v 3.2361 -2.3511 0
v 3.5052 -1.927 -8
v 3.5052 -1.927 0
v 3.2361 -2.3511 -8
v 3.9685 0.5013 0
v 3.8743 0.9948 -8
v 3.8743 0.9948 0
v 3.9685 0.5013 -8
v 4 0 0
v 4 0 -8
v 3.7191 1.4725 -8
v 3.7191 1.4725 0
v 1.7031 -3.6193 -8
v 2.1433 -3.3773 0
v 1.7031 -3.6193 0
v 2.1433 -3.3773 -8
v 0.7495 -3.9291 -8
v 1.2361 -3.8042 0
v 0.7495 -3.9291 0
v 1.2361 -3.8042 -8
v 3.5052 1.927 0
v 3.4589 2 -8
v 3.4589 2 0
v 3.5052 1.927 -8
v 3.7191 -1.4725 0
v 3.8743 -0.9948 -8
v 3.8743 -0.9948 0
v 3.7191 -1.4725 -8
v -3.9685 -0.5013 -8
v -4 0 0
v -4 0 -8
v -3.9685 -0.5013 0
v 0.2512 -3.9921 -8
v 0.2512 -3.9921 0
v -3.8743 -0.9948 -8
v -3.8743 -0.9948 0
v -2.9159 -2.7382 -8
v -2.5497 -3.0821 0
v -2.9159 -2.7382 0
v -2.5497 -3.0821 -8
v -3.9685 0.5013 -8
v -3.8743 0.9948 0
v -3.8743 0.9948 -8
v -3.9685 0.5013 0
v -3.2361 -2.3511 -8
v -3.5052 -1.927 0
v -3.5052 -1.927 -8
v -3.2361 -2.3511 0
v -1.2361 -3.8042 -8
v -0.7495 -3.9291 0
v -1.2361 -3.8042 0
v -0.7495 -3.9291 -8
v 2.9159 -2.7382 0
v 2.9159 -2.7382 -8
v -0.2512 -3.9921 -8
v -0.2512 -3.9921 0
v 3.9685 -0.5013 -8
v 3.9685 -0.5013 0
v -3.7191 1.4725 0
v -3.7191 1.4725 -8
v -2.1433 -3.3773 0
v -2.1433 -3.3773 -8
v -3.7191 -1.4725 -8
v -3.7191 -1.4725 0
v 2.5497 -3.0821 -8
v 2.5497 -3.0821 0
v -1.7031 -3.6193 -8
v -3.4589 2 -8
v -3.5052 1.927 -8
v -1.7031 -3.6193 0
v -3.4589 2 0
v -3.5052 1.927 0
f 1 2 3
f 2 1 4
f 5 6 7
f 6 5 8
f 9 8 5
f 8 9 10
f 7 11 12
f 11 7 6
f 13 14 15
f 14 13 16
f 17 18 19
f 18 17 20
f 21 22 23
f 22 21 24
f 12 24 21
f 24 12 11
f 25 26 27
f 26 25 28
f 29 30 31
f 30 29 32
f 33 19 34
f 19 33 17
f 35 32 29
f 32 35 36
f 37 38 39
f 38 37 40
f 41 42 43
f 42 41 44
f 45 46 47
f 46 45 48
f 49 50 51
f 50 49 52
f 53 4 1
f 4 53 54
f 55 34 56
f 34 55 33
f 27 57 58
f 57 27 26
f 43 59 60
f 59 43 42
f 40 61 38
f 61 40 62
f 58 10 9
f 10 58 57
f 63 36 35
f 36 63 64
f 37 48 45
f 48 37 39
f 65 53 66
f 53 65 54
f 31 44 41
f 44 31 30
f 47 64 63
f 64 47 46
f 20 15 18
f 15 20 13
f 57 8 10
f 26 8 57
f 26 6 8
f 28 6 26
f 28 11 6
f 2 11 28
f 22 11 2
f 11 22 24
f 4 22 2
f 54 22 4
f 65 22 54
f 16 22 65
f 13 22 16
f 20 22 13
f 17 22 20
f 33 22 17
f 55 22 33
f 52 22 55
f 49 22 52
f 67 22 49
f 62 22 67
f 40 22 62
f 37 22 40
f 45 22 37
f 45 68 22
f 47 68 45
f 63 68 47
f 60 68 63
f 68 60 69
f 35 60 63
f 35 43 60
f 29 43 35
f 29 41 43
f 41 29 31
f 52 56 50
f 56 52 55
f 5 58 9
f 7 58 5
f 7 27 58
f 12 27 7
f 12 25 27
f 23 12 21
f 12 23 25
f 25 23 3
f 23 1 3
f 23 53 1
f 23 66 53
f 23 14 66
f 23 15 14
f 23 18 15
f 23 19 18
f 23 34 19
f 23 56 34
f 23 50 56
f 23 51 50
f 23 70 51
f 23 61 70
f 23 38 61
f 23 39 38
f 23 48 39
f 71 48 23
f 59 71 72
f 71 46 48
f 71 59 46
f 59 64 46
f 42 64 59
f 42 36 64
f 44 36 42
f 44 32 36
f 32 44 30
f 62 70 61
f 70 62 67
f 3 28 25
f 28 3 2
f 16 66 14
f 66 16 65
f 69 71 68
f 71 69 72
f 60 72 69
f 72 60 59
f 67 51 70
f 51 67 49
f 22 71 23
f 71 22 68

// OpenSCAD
$fn = 50;

difference() {
	union() {
		difference() {
			translate(v = [0, 0, -8]) {
				cylinder(h = 8, r = 4);
			}
			translate(v = [-4, 2, -8]) {
				cube(size = [8, 2, 8]);
			}
		}
	}
	union();
}
